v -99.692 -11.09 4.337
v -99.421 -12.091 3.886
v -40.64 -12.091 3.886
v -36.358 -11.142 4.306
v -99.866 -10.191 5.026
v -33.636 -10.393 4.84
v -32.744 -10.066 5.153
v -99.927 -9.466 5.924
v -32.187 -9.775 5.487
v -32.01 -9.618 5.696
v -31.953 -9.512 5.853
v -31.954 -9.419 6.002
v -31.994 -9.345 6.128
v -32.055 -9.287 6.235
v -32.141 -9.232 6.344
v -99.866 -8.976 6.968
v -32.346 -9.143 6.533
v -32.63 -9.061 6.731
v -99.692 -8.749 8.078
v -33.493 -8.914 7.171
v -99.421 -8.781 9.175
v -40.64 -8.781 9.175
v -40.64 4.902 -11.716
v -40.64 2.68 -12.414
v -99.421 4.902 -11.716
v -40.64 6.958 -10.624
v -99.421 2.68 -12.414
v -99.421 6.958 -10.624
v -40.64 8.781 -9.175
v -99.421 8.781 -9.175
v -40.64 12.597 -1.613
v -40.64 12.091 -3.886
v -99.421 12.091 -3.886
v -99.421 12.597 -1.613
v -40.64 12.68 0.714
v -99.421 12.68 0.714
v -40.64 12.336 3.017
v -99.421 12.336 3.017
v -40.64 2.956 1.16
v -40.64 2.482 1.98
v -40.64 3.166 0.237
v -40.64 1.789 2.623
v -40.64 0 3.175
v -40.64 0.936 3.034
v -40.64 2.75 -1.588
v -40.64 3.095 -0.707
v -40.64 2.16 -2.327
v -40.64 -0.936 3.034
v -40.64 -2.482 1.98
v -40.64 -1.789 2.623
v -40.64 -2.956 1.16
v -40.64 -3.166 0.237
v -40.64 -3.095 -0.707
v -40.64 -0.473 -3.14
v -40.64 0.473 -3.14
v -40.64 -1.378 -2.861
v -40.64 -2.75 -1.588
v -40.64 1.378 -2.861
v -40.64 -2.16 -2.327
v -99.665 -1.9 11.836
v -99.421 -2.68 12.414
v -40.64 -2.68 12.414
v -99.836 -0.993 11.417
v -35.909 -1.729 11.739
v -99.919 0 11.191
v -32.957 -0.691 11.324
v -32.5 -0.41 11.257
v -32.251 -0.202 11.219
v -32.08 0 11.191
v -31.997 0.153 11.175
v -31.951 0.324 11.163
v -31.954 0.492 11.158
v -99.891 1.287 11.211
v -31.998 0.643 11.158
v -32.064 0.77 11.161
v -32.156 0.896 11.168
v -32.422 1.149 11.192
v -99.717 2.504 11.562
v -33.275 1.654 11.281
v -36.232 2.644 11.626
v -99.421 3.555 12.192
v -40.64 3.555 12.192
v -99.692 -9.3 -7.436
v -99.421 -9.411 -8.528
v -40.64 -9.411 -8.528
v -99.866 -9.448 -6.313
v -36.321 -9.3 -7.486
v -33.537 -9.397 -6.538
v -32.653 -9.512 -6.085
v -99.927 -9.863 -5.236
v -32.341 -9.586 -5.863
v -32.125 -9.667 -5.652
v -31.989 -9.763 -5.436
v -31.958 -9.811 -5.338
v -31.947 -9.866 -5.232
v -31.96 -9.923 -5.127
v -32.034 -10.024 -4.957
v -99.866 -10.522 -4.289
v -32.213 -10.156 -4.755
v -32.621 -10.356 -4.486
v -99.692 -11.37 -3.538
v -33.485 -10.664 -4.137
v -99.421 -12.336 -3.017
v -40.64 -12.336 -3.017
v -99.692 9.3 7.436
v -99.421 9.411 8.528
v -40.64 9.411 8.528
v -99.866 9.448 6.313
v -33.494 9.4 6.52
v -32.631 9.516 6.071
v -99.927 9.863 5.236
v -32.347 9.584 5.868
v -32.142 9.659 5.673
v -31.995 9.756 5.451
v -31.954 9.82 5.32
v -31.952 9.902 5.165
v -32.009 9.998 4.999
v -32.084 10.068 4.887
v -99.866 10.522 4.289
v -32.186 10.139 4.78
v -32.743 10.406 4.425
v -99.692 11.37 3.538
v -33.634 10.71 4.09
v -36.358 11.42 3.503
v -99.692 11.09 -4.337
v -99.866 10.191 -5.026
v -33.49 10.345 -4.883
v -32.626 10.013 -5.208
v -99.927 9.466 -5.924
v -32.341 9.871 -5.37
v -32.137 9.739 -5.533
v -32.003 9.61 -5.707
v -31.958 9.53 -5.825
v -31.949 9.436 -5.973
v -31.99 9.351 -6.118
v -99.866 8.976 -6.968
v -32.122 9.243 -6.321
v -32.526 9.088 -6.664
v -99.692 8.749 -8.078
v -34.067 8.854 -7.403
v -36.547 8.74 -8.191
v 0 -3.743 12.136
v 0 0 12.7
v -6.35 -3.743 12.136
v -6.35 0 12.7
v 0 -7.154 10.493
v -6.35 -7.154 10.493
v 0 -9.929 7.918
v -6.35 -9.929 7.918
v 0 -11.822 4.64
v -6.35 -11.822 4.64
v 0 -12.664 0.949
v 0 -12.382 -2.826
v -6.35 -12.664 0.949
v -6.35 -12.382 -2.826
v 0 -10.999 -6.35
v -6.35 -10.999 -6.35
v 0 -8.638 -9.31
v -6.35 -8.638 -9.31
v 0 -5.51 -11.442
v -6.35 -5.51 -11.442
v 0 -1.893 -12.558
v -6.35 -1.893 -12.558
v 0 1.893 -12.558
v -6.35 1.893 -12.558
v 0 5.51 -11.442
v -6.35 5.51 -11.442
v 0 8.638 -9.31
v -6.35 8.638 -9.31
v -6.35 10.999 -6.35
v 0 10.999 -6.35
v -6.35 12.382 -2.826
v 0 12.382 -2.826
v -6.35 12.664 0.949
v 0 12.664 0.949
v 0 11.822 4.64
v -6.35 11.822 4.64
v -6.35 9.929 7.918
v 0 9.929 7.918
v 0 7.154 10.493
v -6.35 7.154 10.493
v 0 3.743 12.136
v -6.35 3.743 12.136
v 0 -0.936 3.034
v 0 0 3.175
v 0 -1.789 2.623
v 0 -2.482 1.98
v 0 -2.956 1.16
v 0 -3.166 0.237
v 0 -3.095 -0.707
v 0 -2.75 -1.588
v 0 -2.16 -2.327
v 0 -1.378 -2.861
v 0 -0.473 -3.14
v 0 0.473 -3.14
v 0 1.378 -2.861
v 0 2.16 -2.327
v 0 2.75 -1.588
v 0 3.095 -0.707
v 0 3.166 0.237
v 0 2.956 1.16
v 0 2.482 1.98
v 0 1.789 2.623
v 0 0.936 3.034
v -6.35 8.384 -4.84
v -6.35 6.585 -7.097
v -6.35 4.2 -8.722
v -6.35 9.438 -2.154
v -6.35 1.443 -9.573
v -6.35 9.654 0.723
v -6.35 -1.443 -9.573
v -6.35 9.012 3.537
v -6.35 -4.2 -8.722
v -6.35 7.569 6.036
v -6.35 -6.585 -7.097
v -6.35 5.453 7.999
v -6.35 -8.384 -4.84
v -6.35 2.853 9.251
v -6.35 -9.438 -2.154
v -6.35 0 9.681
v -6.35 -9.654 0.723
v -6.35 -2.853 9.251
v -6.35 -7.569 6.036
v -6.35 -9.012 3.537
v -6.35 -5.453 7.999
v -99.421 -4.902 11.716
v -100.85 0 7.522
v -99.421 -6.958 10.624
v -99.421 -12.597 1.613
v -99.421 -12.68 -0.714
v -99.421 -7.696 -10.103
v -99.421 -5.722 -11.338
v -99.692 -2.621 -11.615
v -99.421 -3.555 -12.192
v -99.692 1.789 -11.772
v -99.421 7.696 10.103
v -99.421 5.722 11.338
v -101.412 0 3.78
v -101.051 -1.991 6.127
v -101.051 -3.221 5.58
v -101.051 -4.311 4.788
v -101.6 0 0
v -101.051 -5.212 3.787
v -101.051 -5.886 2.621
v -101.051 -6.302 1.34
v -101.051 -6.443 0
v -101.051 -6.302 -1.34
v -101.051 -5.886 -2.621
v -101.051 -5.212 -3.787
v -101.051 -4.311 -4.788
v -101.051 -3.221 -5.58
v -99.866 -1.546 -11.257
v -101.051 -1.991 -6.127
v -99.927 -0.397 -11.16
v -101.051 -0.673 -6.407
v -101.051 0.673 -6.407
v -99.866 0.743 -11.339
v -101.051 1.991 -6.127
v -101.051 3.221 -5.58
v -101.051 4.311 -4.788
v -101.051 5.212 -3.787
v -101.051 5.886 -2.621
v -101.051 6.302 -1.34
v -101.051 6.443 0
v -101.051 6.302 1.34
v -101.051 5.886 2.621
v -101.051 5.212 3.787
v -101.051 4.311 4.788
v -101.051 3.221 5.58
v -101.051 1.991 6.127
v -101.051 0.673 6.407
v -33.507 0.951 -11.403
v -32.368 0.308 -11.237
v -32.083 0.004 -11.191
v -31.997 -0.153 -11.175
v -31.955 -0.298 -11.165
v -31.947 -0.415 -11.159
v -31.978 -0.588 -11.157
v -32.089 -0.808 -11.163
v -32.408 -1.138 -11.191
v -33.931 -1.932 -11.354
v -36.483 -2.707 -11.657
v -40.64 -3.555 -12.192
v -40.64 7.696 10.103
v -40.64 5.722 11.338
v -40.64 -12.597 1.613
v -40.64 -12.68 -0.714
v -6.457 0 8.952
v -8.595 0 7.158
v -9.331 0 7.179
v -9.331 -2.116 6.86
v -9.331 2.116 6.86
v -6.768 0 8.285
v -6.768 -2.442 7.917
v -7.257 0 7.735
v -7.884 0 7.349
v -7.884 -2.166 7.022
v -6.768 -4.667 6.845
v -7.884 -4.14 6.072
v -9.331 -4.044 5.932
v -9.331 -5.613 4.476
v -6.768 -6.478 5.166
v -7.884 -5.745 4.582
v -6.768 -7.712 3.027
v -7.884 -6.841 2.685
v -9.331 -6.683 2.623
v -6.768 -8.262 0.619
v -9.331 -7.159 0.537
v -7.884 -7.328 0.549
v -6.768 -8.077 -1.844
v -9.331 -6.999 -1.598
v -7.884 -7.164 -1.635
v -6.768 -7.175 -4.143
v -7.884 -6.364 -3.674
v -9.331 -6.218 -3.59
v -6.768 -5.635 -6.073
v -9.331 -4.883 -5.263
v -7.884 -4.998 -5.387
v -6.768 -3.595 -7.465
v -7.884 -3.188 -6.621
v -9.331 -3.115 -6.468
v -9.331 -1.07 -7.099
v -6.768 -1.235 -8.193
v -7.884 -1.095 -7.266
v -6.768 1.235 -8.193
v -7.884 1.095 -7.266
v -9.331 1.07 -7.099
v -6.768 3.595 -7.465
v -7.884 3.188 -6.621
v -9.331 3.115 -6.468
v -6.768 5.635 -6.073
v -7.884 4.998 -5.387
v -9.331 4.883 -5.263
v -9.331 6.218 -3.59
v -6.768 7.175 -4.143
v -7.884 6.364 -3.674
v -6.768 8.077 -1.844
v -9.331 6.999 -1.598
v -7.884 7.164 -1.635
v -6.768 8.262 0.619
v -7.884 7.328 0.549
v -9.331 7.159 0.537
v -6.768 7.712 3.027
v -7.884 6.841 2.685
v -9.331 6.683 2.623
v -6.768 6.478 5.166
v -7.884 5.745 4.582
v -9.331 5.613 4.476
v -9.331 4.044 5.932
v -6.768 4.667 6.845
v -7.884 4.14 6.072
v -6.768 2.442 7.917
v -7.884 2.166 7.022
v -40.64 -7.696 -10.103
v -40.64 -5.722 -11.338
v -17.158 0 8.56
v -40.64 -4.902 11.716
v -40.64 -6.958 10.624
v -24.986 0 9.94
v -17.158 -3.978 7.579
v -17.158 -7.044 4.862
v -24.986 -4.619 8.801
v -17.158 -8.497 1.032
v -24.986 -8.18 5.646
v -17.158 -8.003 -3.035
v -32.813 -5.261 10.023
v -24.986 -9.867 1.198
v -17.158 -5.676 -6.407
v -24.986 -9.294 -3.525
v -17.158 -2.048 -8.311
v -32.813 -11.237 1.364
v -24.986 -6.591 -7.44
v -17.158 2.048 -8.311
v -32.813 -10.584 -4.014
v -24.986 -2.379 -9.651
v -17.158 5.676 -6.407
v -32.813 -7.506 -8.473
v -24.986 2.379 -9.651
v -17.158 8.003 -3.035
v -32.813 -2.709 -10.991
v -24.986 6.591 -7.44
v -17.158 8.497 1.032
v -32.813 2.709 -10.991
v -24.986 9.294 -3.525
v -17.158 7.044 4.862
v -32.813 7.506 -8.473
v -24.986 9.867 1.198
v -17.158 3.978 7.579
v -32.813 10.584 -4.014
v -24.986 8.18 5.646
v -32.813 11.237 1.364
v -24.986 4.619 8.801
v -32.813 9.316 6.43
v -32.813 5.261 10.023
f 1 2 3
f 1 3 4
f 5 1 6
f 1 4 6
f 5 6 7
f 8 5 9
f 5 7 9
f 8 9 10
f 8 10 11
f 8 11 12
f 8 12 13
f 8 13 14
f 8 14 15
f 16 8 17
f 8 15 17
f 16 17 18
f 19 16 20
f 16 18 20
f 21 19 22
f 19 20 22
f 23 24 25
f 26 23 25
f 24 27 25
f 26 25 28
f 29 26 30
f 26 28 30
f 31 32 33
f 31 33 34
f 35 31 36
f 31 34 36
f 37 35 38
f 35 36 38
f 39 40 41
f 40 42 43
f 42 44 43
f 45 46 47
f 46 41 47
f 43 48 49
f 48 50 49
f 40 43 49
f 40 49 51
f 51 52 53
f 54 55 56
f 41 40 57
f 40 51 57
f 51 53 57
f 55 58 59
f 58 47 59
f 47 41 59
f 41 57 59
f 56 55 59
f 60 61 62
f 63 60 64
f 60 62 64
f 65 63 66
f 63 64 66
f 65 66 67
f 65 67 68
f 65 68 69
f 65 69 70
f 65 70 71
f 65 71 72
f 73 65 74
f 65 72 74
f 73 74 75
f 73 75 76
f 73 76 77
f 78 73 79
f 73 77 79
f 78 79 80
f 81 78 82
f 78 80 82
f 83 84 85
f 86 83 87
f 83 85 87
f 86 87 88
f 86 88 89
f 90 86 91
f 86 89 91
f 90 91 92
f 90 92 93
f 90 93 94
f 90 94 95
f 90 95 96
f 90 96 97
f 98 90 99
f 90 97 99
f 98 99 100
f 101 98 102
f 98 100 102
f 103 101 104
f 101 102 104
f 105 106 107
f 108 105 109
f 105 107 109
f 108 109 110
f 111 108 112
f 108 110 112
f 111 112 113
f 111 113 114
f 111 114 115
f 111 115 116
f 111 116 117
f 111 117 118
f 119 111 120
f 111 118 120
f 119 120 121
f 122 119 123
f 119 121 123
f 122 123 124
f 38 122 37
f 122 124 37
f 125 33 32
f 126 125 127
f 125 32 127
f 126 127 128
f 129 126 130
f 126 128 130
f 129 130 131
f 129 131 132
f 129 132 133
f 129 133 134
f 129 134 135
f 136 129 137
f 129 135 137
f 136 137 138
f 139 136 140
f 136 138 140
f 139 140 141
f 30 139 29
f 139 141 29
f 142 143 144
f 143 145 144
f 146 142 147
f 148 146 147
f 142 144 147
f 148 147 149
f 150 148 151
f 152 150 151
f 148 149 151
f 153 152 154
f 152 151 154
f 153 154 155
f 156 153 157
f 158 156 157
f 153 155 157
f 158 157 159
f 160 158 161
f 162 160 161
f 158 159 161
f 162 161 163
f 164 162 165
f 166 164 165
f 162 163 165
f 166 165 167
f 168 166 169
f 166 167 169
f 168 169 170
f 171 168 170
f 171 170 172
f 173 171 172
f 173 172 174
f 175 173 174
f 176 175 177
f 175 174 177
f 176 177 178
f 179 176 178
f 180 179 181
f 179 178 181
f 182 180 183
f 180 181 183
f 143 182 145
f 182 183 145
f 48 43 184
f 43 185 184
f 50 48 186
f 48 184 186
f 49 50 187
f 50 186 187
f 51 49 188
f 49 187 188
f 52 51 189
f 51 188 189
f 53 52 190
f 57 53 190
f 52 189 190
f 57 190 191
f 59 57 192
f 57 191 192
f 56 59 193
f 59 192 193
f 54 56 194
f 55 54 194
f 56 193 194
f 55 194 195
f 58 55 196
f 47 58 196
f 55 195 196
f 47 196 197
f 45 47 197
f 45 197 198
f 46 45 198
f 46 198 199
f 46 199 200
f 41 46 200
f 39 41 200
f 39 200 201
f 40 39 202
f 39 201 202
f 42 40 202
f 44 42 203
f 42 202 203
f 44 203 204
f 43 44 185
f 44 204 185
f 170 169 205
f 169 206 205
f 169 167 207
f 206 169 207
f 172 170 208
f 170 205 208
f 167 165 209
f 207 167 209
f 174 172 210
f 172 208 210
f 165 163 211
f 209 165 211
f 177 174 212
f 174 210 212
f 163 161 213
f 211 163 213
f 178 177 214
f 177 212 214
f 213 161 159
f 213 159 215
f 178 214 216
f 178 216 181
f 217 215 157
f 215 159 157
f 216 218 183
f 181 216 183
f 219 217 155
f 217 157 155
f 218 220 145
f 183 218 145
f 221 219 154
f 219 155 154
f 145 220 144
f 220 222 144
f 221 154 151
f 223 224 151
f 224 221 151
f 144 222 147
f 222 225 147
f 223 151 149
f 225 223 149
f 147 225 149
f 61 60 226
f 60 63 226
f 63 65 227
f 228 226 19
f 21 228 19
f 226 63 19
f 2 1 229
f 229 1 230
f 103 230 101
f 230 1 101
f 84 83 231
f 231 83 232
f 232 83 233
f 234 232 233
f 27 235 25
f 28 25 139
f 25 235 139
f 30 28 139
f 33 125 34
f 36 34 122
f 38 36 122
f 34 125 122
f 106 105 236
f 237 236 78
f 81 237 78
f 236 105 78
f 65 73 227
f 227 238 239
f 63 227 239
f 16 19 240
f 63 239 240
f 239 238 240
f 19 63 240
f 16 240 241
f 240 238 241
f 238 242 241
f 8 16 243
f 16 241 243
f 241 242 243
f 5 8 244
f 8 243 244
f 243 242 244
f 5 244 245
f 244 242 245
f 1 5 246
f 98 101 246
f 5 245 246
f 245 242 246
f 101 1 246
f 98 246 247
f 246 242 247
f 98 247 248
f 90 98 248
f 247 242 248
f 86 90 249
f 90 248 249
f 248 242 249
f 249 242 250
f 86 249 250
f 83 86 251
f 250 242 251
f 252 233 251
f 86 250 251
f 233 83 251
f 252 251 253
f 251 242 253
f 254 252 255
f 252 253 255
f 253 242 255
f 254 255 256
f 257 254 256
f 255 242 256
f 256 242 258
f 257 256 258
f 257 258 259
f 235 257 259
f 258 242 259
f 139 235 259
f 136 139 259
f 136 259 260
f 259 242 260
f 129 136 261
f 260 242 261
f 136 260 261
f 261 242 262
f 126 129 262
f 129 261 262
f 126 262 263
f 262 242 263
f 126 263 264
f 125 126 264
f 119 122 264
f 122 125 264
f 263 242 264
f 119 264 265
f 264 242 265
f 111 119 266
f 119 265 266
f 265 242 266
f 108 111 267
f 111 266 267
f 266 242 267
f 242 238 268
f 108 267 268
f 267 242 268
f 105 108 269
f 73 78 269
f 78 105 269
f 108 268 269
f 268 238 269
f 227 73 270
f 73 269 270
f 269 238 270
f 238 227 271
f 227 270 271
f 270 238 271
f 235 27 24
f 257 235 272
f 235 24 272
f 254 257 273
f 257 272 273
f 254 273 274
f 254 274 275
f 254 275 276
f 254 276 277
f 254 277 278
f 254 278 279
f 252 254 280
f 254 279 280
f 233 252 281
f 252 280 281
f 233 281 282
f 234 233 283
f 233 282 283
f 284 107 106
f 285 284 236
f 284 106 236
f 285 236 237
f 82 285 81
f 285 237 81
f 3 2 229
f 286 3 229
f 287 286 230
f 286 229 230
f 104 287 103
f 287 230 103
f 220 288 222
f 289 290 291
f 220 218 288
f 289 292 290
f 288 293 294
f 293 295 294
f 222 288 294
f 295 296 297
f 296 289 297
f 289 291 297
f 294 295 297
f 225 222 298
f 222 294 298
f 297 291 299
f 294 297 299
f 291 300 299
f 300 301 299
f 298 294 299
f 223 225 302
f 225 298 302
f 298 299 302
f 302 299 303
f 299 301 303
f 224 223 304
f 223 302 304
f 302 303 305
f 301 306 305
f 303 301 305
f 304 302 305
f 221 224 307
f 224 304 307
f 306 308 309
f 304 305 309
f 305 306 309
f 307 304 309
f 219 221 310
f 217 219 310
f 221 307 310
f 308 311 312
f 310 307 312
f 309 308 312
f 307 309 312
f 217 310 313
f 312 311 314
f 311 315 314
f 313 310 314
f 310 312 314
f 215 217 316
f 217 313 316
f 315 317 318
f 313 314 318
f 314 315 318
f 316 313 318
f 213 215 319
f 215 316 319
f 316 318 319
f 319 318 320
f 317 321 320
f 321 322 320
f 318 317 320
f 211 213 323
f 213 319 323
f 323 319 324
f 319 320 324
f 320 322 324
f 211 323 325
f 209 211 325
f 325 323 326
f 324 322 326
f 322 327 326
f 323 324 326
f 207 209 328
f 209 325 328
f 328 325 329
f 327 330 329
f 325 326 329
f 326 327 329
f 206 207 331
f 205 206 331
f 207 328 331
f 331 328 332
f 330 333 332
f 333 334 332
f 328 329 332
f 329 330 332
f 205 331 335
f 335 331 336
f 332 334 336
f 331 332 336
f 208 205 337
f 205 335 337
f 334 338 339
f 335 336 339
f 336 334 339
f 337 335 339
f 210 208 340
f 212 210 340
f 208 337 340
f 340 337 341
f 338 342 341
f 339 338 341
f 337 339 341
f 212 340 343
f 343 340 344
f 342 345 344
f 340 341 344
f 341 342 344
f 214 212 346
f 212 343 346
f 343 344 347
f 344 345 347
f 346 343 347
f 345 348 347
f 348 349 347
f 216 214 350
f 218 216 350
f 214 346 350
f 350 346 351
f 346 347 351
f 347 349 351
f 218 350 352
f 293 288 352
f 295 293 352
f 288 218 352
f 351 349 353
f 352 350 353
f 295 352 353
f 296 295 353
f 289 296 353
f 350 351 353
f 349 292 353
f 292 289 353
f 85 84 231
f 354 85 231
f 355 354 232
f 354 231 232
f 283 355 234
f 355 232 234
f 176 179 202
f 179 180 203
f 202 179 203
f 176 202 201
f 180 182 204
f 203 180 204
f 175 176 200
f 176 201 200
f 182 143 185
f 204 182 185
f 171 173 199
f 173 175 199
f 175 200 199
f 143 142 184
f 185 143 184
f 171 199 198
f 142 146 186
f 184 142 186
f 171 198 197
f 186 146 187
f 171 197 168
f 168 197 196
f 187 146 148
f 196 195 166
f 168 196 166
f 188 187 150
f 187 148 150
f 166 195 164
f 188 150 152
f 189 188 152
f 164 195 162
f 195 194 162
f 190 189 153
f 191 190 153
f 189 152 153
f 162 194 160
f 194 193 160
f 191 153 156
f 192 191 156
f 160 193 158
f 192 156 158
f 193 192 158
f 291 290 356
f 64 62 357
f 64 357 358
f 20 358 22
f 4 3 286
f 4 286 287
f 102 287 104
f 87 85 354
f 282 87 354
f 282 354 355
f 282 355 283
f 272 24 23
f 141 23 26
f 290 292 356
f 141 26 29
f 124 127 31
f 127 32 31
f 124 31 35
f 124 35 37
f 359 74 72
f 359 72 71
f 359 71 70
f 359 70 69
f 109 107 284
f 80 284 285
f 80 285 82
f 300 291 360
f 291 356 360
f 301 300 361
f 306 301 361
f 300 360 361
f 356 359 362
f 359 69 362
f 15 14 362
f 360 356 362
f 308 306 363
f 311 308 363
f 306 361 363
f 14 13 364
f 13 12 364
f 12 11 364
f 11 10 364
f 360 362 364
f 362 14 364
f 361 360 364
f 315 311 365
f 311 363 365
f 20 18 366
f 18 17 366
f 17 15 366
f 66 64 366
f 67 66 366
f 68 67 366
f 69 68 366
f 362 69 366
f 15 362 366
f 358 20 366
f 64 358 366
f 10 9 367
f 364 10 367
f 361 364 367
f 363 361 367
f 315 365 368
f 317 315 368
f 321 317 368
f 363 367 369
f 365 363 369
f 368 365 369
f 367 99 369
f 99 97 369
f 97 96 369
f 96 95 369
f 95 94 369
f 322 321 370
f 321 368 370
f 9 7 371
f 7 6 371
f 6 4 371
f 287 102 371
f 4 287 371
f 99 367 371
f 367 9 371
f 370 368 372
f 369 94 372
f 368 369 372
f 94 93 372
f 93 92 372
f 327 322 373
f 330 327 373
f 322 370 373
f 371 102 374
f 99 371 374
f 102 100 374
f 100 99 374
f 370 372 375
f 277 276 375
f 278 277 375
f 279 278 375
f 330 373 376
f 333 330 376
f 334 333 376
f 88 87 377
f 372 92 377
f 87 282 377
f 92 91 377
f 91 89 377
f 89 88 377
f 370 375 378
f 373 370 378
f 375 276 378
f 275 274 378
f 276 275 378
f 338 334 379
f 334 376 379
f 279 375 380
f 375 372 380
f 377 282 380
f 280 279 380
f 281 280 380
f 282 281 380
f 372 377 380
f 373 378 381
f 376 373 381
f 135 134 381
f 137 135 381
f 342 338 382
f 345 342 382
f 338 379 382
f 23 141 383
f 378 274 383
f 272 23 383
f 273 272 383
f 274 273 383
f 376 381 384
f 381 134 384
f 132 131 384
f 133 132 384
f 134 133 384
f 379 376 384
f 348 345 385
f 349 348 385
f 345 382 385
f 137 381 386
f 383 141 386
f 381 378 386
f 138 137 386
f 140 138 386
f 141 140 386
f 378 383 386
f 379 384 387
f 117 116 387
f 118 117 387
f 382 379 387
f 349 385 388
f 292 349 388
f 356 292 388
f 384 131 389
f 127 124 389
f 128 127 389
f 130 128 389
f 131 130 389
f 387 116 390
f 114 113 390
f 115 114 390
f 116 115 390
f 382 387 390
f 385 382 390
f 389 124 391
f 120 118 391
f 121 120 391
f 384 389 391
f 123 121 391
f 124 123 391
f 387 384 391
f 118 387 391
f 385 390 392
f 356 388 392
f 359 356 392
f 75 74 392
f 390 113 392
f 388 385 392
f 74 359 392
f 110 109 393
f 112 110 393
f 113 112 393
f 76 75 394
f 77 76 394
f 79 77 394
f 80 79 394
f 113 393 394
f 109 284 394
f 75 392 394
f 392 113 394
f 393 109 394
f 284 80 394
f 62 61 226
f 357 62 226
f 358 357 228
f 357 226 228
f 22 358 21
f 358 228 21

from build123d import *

# Parameters (mm, degrees)
F3_START = -7.62
F2_R     = 4.826
F3_DEPTH = 93.981


with BuildPart() as f1:
    # F0 (on Front) → F1 (revolve)
    with BuildSketch(Plane.XZ):
        with BuildLine():
            Line((0, 3.175), (0, 7.1581820314))
            Line((0, 7.1581820314), (0, 12.7))
            Line((0, 12.7), (-6.35, 12.7))
            Line((-6.35, 12.7), (-6.35, 9.6808019567))
            ThreePointArc((-6.35, 9.6808019567), (-7.2573194714, 7.7350490712), (-9.3310663713, 7.179390264))
            Line((-9.3310663713, 7.179390264), (-40.64, 12.7))
            Line((-40.64, 12.7), (-99.4210244843, 12.7))
            ThreePointArc((-99.4210244843, 12.7), (-101.0513051228, 6.4427853895), (-101.6, 0))
            Line((-101.6, 0), (-40.64, 0))
            Line((-40.64, 0), (-40.64, 3.175))
            Line((-40.64, 3.175), (0, 3.175))
        make_face()
    revolve(axis=Axis((-71.12, 0, 0), (1, 0, 0)))

    # F2 (on face) → F3 (cut)
    with BuildSketch(Plane.YZ.offset(F3_START)):
        with Locations((-14.1259352998, -7.4992162652)):
            Circle(F2_R)
        with Locations((-13.557479444, 8.4838106893)):
            Circle(F2_R)
        with Locations((0.5684558558, 15.9830269545)):
            Circle(F2_R)
        with Locations((14.1259352998, 7.4992162652)):
            Circle(F2_R)
        with Locations((13.557479444, -8.4838106893)):
            Circle(F2_R)
        with Locations((-0.5684558558, -15.9830269545)):
            Circle(F2_R)
    extrude(amount=-F3_DEPTH, mode=Mode.SUBTRACT)


solid = f1.part
